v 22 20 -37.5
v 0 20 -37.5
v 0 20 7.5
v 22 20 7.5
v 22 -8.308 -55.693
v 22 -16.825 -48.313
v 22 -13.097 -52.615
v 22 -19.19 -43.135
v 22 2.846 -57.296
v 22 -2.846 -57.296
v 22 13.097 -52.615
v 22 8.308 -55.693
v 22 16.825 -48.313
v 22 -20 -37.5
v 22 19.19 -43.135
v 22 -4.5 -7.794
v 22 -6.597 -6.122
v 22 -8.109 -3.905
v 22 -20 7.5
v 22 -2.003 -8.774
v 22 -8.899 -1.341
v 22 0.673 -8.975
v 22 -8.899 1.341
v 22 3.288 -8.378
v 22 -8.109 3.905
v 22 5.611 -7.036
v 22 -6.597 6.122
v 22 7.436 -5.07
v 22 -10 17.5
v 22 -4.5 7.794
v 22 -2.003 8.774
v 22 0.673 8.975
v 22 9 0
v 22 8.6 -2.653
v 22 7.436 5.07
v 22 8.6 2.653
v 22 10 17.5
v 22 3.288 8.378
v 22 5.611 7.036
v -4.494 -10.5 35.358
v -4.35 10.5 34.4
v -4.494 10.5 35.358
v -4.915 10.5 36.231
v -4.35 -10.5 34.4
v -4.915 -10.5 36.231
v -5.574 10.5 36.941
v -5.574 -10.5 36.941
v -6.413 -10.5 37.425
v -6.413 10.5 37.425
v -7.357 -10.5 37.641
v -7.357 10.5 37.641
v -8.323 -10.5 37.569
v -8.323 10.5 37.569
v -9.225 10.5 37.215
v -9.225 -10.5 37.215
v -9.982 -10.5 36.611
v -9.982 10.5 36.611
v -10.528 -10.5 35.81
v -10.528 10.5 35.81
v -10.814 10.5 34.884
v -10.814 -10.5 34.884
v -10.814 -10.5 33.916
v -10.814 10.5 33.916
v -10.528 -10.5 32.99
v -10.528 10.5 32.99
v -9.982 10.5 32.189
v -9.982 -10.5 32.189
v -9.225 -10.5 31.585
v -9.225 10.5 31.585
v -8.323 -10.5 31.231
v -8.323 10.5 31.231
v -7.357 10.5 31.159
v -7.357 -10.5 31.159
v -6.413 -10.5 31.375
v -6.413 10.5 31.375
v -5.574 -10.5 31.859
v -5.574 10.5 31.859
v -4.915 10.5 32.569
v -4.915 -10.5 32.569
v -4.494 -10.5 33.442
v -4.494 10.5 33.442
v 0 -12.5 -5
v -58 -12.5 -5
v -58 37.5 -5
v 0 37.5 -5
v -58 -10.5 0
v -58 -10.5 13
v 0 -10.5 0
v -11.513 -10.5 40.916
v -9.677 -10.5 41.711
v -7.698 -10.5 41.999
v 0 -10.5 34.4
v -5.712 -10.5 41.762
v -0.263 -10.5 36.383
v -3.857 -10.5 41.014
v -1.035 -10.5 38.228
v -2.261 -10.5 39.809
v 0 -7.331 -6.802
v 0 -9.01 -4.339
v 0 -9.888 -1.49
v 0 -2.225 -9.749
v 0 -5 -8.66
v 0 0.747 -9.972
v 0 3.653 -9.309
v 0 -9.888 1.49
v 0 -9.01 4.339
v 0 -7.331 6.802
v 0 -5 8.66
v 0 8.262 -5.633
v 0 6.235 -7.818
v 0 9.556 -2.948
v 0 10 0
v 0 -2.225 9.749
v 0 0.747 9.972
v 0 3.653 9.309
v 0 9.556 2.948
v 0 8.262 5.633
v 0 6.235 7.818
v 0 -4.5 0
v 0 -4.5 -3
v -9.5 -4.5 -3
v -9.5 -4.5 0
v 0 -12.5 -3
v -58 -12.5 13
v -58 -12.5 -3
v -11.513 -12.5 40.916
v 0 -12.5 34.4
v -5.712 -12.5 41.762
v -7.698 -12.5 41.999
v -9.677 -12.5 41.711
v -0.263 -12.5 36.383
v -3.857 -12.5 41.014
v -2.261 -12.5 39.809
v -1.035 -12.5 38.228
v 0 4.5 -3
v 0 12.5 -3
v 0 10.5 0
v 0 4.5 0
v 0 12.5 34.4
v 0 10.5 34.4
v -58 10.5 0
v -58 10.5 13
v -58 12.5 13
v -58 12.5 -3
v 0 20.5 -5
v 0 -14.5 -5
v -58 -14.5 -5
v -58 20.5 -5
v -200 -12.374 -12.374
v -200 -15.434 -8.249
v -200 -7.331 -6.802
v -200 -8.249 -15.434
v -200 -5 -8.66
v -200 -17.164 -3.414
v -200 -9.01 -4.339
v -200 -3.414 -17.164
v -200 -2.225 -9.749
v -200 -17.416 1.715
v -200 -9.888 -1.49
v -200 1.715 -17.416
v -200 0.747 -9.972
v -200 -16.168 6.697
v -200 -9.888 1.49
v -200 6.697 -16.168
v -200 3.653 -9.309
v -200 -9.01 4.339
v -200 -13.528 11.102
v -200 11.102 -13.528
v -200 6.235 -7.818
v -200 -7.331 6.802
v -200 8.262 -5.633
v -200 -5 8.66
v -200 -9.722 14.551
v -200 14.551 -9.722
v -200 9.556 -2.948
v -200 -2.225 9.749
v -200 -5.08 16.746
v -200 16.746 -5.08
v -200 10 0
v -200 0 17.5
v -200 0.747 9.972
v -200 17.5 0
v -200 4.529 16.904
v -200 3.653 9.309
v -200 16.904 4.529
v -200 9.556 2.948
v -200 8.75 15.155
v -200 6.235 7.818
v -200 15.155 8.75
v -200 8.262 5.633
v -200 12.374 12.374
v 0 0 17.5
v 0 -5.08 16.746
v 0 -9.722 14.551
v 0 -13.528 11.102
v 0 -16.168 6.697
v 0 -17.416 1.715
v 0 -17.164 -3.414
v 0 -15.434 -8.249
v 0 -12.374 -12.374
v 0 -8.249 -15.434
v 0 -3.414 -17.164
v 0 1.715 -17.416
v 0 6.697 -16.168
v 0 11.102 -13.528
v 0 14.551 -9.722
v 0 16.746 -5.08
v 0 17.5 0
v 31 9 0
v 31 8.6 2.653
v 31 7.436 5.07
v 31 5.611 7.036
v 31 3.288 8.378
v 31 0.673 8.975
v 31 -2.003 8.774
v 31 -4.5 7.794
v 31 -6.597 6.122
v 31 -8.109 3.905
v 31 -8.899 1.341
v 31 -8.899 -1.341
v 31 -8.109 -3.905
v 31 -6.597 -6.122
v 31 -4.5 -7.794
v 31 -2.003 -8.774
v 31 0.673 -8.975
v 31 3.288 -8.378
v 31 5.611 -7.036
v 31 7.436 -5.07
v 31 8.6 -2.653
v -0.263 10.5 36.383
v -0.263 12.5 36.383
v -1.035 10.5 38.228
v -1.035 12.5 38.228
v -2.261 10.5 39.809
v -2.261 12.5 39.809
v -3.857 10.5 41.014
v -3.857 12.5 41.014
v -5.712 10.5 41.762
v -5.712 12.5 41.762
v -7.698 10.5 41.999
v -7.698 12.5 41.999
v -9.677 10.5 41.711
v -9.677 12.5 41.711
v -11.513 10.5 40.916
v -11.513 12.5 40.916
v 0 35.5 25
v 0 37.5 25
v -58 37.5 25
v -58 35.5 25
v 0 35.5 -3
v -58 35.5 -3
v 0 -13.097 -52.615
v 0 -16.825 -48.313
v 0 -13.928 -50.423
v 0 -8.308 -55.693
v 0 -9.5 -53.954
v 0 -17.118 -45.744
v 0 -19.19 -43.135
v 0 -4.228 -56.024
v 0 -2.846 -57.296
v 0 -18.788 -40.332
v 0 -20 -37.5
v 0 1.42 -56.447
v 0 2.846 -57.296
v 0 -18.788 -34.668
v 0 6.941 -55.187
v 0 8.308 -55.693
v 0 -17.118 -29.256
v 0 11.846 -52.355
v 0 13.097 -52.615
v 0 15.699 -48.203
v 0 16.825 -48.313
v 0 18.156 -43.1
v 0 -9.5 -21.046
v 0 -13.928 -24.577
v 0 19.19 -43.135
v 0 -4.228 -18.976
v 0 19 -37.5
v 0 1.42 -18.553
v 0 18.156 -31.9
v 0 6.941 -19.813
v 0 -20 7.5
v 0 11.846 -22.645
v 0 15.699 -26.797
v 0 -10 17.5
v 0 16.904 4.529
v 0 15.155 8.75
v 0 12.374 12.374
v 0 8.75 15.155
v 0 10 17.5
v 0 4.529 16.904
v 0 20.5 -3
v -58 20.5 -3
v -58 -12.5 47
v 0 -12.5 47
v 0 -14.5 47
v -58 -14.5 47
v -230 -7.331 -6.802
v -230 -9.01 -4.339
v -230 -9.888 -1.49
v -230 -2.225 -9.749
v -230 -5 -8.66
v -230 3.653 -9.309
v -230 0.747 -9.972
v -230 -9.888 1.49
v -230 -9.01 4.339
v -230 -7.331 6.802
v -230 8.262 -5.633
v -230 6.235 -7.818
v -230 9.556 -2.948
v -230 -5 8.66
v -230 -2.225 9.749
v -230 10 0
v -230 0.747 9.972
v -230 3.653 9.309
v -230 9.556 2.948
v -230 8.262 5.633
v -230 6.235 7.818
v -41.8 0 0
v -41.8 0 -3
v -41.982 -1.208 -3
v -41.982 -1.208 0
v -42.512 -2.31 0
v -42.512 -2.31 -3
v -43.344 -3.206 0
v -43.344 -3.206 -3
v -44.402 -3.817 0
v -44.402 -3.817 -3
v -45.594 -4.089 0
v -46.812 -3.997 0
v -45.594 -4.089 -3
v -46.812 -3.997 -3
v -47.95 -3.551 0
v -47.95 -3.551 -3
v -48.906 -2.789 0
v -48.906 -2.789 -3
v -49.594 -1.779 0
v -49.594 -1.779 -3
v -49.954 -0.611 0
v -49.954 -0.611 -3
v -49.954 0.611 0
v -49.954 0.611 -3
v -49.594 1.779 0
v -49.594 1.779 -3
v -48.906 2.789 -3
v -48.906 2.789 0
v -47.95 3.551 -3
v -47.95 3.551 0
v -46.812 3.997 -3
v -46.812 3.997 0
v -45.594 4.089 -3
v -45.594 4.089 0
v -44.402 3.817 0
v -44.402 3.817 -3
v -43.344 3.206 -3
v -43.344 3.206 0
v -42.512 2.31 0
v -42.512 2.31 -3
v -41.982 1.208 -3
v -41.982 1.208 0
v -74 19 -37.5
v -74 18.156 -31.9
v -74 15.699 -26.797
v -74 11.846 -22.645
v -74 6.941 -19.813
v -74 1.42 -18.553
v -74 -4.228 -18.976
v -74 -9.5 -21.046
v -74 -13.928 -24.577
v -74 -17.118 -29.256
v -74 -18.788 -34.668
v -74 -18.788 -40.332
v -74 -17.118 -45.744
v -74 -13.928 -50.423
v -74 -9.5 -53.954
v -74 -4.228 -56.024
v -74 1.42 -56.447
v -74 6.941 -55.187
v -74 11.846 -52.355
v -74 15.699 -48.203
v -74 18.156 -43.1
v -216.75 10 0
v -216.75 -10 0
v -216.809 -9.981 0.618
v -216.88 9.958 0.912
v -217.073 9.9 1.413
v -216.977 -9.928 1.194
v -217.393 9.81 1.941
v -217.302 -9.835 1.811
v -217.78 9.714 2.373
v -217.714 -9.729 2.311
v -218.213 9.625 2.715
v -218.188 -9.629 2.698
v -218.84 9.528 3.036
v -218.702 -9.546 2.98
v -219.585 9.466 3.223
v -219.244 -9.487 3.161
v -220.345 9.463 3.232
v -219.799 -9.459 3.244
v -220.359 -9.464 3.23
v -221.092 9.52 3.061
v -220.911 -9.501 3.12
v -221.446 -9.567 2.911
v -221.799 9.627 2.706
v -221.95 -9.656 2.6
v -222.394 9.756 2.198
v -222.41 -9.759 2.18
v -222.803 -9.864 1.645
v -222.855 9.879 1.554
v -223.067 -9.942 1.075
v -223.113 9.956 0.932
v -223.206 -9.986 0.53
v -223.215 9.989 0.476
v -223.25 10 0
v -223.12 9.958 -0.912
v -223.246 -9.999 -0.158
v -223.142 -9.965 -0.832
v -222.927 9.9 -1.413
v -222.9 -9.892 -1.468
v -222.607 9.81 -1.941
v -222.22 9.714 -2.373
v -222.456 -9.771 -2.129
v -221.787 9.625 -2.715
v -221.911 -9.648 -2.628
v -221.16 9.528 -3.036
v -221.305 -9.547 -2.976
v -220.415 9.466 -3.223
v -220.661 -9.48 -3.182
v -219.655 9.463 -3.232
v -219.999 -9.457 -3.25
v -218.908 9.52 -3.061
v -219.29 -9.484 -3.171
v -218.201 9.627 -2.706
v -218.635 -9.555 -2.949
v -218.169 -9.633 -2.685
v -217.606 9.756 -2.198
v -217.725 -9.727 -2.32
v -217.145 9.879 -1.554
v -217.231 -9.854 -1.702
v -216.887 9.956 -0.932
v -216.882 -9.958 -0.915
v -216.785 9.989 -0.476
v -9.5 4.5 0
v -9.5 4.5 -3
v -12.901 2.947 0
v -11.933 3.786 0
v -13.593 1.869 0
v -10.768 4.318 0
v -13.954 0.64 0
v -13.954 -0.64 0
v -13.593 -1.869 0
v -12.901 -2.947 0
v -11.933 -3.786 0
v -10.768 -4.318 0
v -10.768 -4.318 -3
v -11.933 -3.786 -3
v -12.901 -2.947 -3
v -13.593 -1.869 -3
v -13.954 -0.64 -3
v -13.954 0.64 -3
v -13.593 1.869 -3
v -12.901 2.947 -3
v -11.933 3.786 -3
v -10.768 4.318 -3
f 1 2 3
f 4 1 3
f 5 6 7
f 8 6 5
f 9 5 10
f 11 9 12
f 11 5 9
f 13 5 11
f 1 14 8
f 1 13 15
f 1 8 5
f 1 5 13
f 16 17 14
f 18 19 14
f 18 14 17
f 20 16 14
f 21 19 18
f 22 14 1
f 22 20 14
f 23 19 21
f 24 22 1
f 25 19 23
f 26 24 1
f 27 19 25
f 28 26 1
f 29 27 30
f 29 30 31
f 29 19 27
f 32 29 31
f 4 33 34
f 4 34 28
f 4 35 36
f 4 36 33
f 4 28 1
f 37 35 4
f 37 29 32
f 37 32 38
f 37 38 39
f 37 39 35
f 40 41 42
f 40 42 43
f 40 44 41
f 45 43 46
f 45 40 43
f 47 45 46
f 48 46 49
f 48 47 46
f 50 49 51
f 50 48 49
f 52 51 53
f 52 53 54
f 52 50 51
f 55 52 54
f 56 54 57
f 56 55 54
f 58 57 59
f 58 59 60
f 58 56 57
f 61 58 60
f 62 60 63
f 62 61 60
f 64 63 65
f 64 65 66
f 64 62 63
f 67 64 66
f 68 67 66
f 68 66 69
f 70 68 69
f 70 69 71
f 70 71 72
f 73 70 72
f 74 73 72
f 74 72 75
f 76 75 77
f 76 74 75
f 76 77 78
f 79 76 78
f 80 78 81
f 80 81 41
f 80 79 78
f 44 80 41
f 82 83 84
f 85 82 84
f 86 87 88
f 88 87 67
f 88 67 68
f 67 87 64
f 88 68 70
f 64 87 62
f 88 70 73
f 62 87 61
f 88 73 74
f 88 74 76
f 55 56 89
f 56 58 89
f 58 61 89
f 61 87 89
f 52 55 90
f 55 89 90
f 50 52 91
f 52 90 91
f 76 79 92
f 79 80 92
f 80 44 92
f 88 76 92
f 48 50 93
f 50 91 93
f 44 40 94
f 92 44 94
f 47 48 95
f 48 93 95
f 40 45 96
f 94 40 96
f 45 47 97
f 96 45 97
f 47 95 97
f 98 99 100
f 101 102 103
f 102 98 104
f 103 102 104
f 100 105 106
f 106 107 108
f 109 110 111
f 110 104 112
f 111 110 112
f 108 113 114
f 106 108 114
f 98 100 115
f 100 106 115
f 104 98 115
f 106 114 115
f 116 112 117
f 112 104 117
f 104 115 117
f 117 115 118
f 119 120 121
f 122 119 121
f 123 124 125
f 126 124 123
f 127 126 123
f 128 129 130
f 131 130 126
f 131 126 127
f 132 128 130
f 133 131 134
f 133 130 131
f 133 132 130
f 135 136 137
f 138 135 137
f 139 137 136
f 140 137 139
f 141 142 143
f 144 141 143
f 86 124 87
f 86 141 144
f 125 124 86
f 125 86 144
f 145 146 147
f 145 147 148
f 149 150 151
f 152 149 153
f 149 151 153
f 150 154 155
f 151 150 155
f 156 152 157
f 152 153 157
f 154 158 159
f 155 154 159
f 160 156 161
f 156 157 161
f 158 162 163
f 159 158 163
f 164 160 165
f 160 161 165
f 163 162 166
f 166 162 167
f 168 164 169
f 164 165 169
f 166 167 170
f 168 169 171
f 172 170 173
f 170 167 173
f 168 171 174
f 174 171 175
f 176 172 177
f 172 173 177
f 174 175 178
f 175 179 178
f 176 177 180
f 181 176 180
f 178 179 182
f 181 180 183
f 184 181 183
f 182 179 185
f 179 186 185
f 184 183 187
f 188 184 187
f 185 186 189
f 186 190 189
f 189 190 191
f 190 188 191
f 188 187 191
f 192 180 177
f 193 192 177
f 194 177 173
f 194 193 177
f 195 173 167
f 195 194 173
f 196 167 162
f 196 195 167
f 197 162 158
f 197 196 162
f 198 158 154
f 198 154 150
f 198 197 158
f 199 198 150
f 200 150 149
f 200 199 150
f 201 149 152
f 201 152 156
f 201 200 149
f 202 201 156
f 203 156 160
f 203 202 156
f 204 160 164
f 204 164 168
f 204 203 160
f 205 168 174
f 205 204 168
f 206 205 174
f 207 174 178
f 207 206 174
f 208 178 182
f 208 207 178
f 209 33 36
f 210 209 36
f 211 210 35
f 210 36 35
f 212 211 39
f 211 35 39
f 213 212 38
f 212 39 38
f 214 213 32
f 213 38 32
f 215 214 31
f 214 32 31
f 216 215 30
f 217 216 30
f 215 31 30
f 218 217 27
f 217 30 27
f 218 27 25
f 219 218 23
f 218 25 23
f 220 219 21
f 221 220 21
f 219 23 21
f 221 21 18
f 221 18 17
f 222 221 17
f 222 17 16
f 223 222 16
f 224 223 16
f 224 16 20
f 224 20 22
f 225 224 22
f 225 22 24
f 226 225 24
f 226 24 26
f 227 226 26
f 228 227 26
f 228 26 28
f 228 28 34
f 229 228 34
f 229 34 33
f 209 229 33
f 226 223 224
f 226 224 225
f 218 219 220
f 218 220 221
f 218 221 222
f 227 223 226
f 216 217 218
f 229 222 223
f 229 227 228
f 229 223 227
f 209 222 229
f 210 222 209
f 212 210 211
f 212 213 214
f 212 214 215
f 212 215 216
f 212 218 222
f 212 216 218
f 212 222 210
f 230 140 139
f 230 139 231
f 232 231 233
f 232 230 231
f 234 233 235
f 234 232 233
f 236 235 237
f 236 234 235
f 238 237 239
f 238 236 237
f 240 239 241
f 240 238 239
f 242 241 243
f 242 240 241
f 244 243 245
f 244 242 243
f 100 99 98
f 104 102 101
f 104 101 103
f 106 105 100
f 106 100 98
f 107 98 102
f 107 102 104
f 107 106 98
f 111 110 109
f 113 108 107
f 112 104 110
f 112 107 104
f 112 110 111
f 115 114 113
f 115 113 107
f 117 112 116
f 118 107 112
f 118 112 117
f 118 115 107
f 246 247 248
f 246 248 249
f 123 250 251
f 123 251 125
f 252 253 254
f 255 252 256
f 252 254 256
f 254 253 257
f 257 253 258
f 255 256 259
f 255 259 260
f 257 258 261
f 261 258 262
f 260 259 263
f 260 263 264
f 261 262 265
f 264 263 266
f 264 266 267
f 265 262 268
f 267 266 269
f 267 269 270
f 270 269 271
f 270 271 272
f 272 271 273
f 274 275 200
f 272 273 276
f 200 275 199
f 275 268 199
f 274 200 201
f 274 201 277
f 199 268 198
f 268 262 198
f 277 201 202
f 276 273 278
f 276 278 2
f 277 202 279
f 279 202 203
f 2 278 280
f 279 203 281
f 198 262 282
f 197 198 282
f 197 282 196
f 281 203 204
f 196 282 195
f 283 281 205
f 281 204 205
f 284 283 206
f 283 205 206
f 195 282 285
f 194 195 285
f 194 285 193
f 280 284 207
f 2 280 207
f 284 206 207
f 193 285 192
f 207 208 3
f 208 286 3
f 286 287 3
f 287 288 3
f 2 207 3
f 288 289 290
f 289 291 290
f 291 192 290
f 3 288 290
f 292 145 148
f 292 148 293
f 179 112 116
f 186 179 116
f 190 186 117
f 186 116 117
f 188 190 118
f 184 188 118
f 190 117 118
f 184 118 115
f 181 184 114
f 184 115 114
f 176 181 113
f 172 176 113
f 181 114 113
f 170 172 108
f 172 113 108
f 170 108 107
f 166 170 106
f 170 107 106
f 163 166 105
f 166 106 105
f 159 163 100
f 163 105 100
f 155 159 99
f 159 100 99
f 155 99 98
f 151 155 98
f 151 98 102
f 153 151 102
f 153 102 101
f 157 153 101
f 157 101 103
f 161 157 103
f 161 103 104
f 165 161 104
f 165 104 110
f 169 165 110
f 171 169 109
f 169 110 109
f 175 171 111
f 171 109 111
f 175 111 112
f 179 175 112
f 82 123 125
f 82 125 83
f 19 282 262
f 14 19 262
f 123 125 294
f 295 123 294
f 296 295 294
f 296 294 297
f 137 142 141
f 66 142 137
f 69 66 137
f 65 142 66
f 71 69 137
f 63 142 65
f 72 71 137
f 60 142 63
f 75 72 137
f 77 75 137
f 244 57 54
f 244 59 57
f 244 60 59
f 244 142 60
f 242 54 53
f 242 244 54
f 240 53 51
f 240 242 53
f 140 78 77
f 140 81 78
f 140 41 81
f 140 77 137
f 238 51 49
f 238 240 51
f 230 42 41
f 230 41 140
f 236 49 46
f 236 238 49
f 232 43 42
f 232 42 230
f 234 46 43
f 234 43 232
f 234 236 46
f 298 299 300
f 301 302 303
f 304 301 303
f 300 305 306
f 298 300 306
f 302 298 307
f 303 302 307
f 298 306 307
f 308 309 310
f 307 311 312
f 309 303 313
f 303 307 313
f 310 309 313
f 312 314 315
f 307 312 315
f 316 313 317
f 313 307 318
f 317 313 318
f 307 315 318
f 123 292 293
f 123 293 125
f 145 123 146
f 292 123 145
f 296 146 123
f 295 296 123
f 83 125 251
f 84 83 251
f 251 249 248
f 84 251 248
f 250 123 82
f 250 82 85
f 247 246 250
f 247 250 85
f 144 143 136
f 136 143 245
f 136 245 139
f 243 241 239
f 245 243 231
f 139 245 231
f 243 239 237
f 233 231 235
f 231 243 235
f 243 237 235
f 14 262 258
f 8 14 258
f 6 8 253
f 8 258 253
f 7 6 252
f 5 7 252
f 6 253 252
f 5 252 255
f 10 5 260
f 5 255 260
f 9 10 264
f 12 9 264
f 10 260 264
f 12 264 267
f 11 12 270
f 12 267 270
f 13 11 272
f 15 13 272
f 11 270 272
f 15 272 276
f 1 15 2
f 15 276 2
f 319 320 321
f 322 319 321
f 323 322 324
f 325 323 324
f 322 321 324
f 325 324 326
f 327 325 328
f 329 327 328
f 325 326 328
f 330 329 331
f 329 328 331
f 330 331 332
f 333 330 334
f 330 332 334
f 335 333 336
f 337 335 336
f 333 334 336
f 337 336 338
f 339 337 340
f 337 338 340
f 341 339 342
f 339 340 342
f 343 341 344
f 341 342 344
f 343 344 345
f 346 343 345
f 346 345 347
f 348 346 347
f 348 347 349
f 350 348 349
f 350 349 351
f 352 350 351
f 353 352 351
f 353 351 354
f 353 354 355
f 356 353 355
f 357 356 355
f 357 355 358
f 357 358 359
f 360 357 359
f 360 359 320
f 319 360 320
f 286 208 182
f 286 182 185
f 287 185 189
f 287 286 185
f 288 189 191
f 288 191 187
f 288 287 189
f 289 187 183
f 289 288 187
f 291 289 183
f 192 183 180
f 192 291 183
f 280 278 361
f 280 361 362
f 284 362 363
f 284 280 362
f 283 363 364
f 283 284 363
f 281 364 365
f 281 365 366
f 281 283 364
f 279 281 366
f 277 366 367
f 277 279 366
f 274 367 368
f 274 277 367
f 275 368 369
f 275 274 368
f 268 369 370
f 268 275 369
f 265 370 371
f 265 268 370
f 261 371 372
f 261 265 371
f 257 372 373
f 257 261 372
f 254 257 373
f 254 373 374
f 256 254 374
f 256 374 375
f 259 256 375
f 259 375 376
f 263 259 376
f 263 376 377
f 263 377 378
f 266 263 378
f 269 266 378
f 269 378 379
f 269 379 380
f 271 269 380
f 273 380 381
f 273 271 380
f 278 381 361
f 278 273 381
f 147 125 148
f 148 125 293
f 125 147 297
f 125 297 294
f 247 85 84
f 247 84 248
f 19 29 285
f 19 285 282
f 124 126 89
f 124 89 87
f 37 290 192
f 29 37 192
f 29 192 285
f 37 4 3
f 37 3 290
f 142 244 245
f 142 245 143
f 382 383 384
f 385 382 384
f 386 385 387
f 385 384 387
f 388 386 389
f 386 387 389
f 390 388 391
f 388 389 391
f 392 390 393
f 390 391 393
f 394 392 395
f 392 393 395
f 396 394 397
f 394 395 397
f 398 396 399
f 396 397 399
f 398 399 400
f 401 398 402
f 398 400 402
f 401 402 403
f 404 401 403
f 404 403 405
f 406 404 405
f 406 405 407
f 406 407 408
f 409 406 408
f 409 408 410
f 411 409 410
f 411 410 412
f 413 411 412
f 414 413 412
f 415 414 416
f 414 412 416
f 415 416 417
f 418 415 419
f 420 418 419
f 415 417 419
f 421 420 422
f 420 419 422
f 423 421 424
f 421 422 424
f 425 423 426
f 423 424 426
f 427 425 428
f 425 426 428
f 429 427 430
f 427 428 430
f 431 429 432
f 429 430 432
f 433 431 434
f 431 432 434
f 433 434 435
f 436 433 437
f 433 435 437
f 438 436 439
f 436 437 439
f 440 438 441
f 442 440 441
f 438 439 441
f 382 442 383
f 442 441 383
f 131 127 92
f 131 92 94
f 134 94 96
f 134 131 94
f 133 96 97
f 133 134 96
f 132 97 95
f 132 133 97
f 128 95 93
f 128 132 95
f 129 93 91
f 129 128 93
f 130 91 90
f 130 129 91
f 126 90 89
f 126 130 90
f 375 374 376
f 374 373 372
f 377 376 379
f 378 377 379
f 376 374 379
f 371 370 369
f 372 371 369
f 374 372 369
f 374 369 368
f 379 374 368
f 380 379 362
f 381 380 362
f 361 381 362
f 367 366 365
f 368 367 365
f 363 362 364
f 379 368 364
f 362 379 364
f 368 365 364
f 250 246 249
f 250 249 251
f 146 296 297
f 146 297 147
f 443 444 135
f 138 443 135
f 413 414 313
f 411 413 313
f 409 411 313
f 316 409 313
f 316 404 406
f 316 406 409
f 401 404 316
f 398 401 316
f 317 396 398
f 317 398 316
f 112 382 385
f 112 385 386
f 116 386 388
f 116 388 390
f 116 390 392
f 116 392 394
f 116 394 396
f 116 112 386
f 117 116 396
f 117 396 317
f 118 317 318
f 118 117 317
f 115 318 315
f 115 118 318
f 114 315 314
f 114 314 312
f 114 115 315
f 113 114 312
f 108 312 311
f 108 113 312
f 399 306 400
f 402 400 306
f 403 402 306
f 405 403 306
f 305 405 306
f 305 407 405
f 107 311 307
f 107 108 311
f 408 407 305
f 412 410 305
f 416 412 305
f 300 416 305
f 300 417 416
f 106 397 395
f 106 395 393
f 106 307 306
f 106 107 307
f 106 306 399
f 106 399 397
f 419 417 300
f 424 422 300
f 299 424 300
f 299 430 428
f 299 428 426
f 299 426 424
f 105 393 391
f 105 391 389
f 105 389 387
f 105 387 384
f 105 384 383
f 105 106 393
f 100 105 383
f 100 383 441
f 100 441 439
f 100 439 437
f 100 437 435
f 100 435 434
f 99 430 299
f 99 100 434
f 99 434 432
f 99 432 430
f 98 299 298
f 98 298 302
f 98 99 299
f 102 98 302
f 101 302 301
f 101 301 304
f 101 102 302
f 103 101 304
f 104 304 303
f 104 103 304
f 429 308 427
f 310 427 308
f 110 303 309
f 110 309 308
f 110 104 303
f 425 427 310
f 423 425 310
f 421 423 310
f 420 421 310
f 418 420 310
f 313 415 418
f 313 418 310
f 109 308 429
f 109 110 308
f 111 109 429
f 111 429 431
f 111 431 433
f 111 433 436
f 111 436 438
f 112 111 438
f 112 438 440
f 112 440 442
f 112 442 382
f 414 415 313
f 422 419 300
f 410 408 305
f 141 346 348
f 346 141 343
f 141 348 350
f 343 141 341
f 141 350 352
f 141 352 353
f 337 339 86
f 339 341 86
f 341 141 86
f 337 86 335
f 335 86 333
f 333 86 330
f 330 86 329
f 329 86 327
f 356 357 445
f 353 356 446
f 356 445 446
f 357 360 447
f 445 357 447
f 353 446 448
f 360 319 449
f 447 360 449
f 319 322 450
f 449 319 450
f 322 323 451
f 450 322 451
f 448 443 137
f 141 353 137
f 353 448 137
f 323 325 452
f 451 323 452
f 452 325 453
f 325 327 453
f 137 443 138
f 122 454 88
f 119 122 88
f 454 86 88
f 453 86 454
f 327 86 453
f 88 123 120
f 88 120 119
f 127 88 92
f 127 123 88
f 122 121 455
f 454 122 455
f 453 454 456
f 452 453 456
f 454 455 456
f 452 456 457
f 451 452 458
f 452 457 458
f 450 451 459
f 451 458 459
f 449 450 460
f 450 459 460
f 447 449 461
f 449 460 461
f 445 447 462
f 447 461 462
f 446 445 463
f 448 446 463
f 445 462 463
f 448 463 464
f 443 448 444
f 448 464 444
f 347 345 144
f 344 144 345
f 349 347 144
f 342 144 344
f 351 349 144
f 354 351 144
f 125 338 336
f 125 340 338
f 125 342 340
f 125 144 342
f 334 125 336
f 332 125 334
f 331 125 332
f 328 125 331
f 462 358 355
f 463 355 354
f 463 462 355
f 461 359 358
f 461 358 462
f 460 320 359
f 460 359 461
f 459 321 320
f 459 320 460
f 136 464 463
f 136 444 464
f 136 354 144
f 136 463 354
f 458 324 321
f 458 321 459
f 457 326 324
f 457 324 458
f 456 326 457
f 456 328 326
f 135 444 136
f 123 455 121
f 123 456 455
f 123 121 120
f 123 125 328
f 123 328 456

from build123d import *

# Parameters (mm, degrees)
F2_R      = 19
F2_R_2    = 10
F2_R_3    = 9
F3_DEPTH  = 22
F4_DEPTH  = 74
F5_DEPTH  = 200
F6_DEPTH  = 31
F7_R      = 10
F8_DEPTH  = 230
F9_R      = 3.25
F10_DEPTH = 10
F11_R     = 3.25
F12_DEPTH = 10
F13_R     = 3.25
F13_W     = 58
F13_H     = 3
F14_DEPTH = 12.5
F15_DEPTH = 10.5
F16_DEPTH = 12.5
F18_DEPTH = 58
F20_DEPTH = 58
F21_R     = 4.1
F22_DEPTH = 5


with BuildPart() as f3:
    # F2 (on Right) → F3 (new body)
    with BuildSketch(Plane.YZ):
        with BuildLine():
            Line((-10, 17.5), (-20, 7.5))
            Line((-20, 7.5), (-20, -37.5))
            ThreePointArc((-20, -37.5), (0, -57.5), (20, -37.5))
            Line((20, -37.5), (20, 7.5))
            Line((20, 7.5), (10, 17.5))
            Line((10, 17.5), (0, 17.5))
            Line((0, 17.5), (-10, 17.5))
        make_face()
        with Locations((0, -37.5)):
            Circle(F2_R, mode=Mode.SUBTRACT)
        with BuildLine():
            ThreePointArc((17.5, 0), (-12.3743686708, -12.3743686708), (0, 17.5))
            ThreePointArc((0, 17.5), (12.3743686708, 12.3743686708), (17.5, 0))
        make_face(mode=Mode.SUBTRACT)
        with Locations((0, -37.5)):
            Circle(F2_R)
        with BuildLine():
            ThreePointArc((17.5, 0), (12.3743686708, 12.3743686708), (0, 17.5))
            ThreePointArc((0, 17.5), (-12.3743686708, -12.3743686708), (17.5, 0))
        make_face()
        Circle(F2_R_2, mode=Mode.SUBTRACT)
        Circle(F2_R_2)
        Circle(F2_R_3, mode=Mode.SUBTRACT)
        Circle(F2_R_3)
    extrude(amount=F3_DEPTH)

    # F2 (on Right) → F4 (join)
    with BuildSketch(Plane.YZ):
        with Locations((0, -37.5)):
            Circle(F2_R)
    extrude(amount=-F4_DEPTH)

    # F2 (on Right) → F5 (join)
    with BuildSketch(Plane.YZ):
        with BuildLine():
            ThreePointArc((17.5, 0), (12.3743686708, 12.3743686708), (0, 17.5))
            ThreePointArc((0, 17.5), (-12.3743686708, -12.3743686708), (17.5, 0))
        make_face()
        Circle(F2_R_2, mode=Mode.SUBTRACT)
    extrude(amount=-F5_DEPTH)

    # F2 (on Right) → F6 (join)
    with BuildSketch(Plane.YZ):
        Circle(F2_R_3)
    extrude(amount=F6_DEPTH)

    # F11 (on Front) → F12 (cut, symmetric)
    with BuildSketch(Plane.XZ):
        with Locations((40, 0)):
            Circle(F11_R)
    extrude(amount=F12_DEPTH, both=True, mode=Mode.SUBTRACT)


with BuildPart() as f8:
    # F7 (on Right) → F8 (new body)
    with BuildSketch(Plane.YZ):
        Circle(F7_R)
    extrude(amount=-F8_DEPTH)

    # F9 (on Front) → F10 (cut, symmetric)
    with BuildSketch(Plane.XZ):
        with Locations((-220, 0)):
            Circle(F9_R)
    extrude(amount=F10_DEPTH, both=True, mode=Mode.SUBTRACT)


with BuildPart() as f14:
    # F13 (on Front) → F14 (new body, symmetric)
    with BuildSketch(Plane.XZ):
        with BuildLine():
            Line((-58, 0), (0, 0))
            Line((0, 0), (0, 34.4))
            ThreePointArc((0, 34.4), (-3.8566941985, 41.0142015147), (-11.5125425465, 40.9155207637))
            Line((-11.5125425465, 40.9155207637), (-58, 13))
            Line((-58, 13), (-58, 0))
        make_face()
        with Locations((-7.6, 34.4)):
            Circle(F13_R, mode=Mode.SUBTRACT)
        with Locations((-29, -1.5)):
            Rectangle(F13_W, F13_H)
    extrude(amount=F14_DEPTH, both=True)

    # F13 (on Front) → F15 (cut, symmetric)
    with BuildSketch(Plane.XZ):
        with BuildLine():
            Line((-58, 0), (0, 0))
            Line((0, 0), (0, 34.4))
            ThreePointArc((0, 34.4), (-3.8566941985, 41.0142015147), (-11.5125425465, 40.9155207637))
            Line((-11.5125425465, 40.9155207637), (-58, 13))
            Line((-58, 13), (-58, 0))
        make_face()
        with Locations((-7.6, 34.4)):
            Circle(F13_R, mode=Mode.SUBTRACT)
    extrude(amount=F15_DEPTH, both=True, mode=Mode.SUBTRACT)

    # F13 (on Front) → F16 (join, symmetric)
    with BuildSketch(Plane.XZ):
        with Locations((-7.6, 34.4)):
            Circle(F13_R)
    extrude(amount=F16_DEPTH, both=True)

    # F21 (on face) → F22 (cut)
    with BuildSketch(Plane(origin=(0, 0, -3), x_dir=(1, 0, 0), z_dir=(0, 0, -1))):
        with Locations((-45.9, 0)):
            Circle(F21_R)
        with BuildLine():
            Line((0, 4.5), (-9.5, 4.5))
            ThreePointArc((-9.5, 4.5), (-14, 0), (-9.5, -4.5))
            Line((-9.5, -4.5), (0, -4.5))
            Line((0, -4.5), (0, 4.5))
        make_face()
    extrude(amount=-F22_DEPTH, mode=Mode.SUBTRACT)


with BuildPart() as f18:
    # F17 (on face) → F18 (new body)
    with BuildSketch(Plane.YZ):
        Polygon((-14.5, -5), (20.5, -5), (20.5, -3), (-12.5, -3), (-12.5, 47), (-14.5, 47), align=None)
    extrude(amount=-F18_DEPTH)


with BuildPart() as f20:
    # F19 (on face) → F20 (new body)
    with BuildSketch(Plane.YZ):
        Polygon((12.5, -3), (-12.5, -3), (-12.5, -5), (37.5, -5), (37.5, 25), (35.5, 25), (35.5, -3), align=None)
    extrude(amount=-F20_DEPTH)


solid = Compound([f3.part, f8.part, f14.part, f18.part, f20.part])
